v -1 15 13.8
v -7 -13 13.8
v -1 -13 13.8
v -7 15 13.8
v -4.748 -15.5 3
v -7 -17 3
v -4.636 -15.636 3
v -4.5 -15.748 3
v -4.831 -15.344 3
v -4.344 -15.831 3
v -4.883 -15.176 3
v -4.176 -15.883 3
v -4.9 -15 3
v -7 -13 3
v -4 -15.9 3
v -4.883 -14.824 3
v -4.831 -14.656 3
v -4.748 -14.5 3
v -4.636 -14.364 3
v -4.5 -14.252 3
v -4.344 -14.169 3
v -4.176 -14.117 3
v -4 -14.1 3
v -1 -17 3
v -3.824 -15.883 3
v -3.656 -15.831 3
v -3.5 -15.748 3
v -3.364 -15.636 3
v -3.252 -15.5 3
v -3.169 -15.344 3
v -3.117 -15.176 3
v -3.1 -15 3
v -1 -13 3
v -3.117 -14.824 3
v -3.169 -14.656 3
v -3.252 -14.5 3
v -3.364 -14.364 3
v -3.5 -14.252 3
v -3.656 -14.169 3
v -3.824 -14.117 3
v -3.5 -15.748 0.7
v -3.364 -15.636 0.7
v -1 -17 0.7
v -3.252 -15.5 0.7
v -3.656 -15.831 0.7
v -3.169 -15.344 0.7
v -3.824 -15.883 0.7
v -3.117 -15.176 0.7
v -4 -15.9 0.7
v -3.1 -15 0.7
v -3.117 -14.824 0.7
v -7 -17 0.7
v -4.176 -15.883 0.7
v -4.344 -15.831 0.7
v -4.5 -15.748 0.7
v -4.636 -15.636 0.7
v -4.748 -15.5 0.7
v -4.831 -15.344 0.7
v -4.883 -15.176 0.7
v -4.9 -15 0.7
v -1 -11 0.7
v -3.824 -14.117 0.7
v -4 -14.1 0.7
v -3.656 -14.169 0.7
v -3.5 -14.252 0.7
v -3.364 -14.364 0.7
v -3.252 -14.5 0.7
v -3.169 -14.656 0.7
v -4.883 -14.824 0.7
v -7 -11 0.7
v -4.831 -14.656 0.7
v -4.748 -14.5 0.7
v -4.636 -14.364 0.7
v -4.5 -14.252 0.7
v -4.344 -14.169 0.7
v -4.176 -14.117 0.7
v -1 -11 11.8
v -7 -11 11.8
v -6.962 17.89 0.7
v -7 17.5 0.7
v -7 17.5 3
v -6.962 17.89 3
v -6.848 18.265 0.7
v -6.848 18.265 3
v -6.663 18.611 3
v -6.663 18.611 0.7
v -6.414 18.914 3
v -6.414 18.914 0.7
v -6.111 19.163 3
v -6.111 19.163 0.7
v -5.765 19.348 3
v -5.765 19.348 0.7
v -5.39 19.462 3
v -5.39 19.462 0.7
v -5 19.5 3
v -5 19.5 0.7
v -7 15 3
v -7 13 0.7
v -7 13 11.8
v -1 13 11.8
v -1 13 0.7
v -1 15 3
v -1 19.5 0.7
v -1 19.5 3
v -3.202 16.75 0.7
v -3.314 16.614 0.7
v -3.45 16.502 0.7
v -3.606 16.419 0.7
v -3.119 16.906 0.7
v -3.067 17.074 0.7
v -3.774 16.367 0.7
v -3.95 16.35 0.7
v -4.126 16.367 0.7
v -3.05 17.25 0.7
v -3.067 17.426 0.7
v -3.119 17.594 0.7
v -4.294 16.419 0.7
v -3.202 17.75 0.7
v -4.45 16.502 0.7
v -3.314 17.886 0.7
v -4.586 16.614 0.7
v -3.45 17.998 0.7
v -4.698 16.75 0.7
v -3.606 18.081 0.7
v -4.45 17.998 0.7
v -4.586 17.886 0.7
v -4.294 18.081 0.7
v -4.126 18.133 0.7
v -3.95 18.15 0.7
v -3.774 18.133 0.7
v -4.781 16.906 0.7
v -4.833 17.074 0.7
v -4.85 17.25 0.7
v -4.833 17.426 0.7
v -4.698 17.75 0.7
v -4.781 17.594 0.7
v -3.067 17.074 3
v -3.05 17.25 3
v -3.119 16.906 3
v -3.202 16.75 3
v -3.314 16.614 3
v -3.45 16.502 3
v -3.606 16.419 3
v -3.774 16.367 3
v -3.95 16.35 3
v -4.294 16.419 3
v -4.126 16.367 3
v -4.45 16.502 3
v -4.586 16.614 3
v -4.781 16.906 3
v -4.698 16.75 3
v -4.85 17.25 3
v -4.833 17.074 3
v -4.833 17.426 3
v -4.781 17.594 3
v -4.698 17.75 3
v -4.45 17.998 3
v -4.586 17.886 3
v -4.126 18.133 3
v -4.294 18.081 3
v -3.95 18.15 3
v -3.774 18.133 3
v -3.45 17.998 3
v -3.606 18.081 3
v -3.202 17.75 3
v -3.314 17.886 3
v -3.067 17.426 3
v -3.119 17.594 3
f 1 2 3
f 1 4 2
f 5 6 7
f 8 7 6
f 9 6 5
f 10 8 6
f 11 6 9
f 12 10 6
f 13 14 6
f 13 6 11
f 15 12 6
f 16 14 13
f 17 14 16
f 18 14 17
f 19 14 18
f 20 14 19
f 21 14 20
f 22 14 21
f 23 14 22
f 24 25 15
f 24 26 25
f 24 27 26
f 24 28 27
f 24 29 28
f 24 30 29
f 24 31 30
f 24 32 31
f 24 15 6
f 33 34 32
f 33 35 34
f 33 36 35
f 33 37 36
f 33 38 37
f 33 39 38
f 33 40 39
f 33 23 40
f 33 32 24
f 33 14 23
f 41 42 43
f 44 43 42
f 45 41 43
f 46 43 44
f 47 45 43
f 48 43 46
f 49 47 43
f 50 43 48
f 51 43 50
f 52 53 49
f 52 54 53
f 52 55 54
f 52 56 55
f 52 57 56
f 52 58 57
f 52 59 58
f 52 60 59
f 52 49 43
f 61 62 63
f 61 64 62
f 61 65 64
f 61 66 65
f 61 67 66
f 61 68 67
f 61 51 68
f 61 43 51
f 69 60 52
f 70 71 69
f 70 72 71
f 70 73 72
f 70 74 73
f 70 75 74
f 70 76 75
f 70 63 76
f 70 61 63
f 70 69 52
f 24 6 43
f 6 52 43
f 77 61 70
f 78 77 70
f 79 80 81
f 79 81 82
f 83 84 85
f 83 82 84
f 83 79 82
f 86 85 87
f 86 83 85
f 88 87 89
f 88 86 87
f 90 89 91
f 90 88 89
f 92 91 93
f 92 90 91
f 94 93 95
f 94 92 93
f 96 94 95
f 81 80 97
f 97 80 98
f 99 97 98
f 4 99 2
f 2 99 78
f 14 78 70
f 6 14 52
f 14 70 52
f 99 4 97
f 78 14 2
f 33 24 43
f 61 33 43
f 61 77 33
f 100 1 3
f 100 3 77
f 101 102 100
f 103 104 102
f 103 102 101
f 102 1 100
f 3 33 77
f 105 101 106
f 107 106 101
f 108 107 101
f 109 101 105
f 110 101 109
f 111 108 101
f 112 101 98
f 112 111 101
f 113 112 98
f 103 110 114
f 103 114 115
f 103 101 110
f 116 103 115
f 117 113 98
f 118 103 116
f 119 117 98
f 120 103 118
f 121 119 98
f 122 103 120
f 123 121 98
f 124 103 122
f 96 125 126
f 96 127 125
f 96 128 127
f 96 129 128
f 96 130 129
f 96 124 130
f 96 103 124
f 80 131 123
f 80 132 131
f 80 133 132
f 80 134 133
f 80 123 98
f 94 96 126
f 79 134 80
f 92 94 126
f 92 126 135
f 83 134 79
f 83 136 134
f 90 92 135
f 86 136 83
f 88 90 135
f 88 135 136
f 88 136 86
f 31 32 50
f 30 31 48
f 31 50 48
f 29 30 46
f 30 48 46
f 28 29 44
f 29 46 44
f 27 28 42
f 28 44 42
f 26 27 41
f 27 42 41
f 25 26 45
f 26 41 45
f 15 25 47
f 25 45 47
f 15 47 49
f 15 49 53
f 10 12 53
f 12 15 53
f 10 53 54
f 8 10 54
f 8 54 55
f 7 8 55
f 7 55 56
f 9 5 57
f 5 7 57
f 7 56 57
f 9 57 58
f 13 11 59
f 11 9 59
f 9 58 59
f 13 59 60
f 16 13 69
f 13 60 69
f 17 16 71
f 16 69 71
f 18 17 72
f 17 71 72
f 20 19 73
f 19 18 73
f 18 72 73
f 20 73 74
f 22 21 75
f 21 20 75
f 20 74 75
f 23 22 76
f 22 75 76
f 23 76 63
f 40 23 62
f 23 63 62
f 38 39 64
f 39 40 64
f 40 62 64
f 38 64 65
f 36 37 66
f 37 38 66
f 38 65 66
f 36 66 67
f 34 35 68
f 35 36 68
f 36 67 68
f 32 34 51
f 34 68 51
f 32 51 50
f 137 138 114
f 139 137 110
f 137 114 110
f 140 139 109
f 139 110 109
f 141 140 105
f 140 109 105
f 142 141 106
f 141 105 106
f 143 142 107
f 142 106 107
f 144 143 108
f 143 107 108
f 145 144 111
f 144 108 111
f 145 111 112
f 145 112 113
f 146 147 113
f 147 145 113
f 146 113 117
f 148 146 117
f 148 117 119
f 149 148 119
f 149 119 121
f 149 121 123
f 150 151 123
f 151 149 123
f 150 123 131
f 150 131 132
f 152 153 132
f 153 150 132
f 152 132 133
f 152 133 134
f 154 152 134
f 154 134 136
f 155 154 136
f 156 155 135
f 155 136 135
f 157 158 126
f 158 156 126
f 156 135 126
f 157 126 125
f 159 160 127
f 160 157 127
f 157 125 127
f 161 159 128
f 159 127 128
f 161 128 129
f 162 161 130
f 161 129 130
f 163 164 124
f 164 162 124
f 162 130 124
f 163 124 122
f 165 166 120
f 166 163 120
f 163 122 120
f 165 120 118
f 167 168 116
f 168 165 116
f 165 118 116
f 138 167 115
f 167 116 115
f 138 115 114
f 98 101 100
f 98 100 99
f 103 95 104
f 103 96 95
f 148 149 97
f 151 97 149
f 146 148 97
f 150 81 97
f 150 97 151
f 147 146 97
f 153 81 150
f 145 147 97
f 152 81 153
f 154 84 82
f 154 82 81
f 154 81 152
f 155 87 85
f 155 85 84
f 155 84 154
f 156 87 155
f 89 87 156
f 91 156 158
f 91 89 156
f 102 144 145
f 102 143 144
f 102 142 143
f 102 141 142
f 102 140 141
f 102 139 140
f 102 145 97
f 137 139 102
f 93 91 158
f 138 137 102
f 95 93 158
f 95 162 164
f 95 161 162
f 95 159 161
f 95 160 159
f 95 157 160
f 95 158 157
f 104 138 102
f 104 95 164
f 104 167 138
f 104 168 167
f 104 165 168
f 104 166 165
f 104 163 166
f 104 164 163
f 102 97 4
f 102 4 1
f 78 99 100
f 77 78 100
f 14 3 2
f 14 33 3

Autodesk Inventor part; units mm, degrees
ref_plane "YZ Plane" through (0, 0, 0) normal (1, 0, 0) x (0, 1, 0)
ref_plane "XZ Plane" through (0, 0, 0) normal (0, 1, 0) x (-1, 0, 0)
ref_plane "XY Plane" through (0, 0, 0) normal (0, 0, 1) x (1, 0, 0)
sketch "Sketch1" plane through (0, 0, 0) normal (0, 0, 1) x (1, 0, 0)
  line L0 (-7, -17) -> (7, -17)
  line L1 (-7, -17) -> (-1, -17)
  line L2 (-1, -17) -> (-1, -11)
  line L3 (-1, -11) -> (-7, -11)
  line L4 (-7, -11) -> (-7, -17)
  line L5 (-5, 19.5) -> (-0.9, 19.5)
  line L6 (-0.9, 19.5) -> (-0.9, 13)
  line L7 (-0.9, 13) -> (-7, 13)
  line L8 (-7, 13) -> (-7, 17.5)
  line L9 (-7, 17.5) -> (-7, -20)
  line L10 (-0.9, 13) -> (-7, 13)
  line L11 (-7, 13) -> (-7, 15)
  line L12 (-7, 15) -> (-0.9, 15)
  line L13 (-0.9, 15) -> (-0.9, 13)
  line L14 (-7, -11) -> (-1, -11)
  line L15 (-1, -11) -> (-1, -13)
  line L16 (-1, -13) -> (-7, -13)
  line L17 (-7, -13) -> (-7, -11)
  circle A0 centre (-3.95, 17.25) radius 0.9
  circle A1 centre (-4, -15) radius 0.9
  arc A2 (-5, 19.5) -> (-7, 17.5) centre (-5, 17.5) ccw
  point P0 (0, 0)
  point P1 (0, 0)
  point P2 (-0.9, 15)
  dimension "d0" = 2
extrude "Extrusion1" add sketch "Sketch1" along normal blind 3 contours L4 L16 L2 L0 | L8 A2 L5 L6 L12
extrude "Extrusion2" add sketch "Sketch1" along normal blind 11.8 contours L8 L12 L6 L7 | L4 L3 L2 L16
sketch "Sketch2" plane through (0, 0, 11.8) normal (0, 0, 1) x (1, 0, 0)
  line L0 (-7, 15) -> (-0.9, 15) projected
  line L1 (-1, -13) -> (-7, -13) projected
  line L2 (-0.9, 15) -> (-7, 15)
  line L3 (-7, 15) -> (-7, -13)
  line L4 (-7, -13) -> (-0.9, -13)
  line L5 (-0.9, -13) -> (-0.9, 15)
  point P0 (0, 0)
extrude "Extrusion3" add sketch "Sketch2" along normal blind 2
sketch "Sketch3" plane through (-0.9, 19.5, 3) normal (1, 0, 0) x (0, 0, -1)
  line L0 (3, -6.5) -> (3, 0) projected
  line L1 (3, 0) -> (0, 0) projected
  line L2 (0, -4.5) -> (0, 0) projected
  line L3 (0, -4.5) -> (-10.8, -4.5) projected
  line L4 (-10.8, -32.5) -> (-10.8, -4.5) projected
  line L5 (-8.8, -32.5) -> (-10.8, -32.5) projected
  line L6 (-8.8, -32.5) -> (-8.8, -6.5) projected
  line L7 (3, -6.5) -> (-8.8, -6.5) projected
  point P0 (3, -19.5)
extrude "Extrusion4" cut sketch "Sketch3" against normal up to surface (0.1 mm away)
sketch "Sketch4" plane through (0, 0, 0) normal (0, 0, -1) x (-1, 0, 0)
  line L0 (12.228, 25.7128) -> (-5.2106, 25.7128)
  line L1 (-5.2106, 25.7128) -> (-5.2106, -24.037)
  line L2 (-5.2106, -24.037) -> (12.228, -24.037)
  line L3 (12.228, -24.037) -> (12.228, 25.7128)
  point P0 (0, 0)
extrude "Extrusion5" cut sketch "Sketch4" against normal blind 0.7
properties part number "holder servo"
